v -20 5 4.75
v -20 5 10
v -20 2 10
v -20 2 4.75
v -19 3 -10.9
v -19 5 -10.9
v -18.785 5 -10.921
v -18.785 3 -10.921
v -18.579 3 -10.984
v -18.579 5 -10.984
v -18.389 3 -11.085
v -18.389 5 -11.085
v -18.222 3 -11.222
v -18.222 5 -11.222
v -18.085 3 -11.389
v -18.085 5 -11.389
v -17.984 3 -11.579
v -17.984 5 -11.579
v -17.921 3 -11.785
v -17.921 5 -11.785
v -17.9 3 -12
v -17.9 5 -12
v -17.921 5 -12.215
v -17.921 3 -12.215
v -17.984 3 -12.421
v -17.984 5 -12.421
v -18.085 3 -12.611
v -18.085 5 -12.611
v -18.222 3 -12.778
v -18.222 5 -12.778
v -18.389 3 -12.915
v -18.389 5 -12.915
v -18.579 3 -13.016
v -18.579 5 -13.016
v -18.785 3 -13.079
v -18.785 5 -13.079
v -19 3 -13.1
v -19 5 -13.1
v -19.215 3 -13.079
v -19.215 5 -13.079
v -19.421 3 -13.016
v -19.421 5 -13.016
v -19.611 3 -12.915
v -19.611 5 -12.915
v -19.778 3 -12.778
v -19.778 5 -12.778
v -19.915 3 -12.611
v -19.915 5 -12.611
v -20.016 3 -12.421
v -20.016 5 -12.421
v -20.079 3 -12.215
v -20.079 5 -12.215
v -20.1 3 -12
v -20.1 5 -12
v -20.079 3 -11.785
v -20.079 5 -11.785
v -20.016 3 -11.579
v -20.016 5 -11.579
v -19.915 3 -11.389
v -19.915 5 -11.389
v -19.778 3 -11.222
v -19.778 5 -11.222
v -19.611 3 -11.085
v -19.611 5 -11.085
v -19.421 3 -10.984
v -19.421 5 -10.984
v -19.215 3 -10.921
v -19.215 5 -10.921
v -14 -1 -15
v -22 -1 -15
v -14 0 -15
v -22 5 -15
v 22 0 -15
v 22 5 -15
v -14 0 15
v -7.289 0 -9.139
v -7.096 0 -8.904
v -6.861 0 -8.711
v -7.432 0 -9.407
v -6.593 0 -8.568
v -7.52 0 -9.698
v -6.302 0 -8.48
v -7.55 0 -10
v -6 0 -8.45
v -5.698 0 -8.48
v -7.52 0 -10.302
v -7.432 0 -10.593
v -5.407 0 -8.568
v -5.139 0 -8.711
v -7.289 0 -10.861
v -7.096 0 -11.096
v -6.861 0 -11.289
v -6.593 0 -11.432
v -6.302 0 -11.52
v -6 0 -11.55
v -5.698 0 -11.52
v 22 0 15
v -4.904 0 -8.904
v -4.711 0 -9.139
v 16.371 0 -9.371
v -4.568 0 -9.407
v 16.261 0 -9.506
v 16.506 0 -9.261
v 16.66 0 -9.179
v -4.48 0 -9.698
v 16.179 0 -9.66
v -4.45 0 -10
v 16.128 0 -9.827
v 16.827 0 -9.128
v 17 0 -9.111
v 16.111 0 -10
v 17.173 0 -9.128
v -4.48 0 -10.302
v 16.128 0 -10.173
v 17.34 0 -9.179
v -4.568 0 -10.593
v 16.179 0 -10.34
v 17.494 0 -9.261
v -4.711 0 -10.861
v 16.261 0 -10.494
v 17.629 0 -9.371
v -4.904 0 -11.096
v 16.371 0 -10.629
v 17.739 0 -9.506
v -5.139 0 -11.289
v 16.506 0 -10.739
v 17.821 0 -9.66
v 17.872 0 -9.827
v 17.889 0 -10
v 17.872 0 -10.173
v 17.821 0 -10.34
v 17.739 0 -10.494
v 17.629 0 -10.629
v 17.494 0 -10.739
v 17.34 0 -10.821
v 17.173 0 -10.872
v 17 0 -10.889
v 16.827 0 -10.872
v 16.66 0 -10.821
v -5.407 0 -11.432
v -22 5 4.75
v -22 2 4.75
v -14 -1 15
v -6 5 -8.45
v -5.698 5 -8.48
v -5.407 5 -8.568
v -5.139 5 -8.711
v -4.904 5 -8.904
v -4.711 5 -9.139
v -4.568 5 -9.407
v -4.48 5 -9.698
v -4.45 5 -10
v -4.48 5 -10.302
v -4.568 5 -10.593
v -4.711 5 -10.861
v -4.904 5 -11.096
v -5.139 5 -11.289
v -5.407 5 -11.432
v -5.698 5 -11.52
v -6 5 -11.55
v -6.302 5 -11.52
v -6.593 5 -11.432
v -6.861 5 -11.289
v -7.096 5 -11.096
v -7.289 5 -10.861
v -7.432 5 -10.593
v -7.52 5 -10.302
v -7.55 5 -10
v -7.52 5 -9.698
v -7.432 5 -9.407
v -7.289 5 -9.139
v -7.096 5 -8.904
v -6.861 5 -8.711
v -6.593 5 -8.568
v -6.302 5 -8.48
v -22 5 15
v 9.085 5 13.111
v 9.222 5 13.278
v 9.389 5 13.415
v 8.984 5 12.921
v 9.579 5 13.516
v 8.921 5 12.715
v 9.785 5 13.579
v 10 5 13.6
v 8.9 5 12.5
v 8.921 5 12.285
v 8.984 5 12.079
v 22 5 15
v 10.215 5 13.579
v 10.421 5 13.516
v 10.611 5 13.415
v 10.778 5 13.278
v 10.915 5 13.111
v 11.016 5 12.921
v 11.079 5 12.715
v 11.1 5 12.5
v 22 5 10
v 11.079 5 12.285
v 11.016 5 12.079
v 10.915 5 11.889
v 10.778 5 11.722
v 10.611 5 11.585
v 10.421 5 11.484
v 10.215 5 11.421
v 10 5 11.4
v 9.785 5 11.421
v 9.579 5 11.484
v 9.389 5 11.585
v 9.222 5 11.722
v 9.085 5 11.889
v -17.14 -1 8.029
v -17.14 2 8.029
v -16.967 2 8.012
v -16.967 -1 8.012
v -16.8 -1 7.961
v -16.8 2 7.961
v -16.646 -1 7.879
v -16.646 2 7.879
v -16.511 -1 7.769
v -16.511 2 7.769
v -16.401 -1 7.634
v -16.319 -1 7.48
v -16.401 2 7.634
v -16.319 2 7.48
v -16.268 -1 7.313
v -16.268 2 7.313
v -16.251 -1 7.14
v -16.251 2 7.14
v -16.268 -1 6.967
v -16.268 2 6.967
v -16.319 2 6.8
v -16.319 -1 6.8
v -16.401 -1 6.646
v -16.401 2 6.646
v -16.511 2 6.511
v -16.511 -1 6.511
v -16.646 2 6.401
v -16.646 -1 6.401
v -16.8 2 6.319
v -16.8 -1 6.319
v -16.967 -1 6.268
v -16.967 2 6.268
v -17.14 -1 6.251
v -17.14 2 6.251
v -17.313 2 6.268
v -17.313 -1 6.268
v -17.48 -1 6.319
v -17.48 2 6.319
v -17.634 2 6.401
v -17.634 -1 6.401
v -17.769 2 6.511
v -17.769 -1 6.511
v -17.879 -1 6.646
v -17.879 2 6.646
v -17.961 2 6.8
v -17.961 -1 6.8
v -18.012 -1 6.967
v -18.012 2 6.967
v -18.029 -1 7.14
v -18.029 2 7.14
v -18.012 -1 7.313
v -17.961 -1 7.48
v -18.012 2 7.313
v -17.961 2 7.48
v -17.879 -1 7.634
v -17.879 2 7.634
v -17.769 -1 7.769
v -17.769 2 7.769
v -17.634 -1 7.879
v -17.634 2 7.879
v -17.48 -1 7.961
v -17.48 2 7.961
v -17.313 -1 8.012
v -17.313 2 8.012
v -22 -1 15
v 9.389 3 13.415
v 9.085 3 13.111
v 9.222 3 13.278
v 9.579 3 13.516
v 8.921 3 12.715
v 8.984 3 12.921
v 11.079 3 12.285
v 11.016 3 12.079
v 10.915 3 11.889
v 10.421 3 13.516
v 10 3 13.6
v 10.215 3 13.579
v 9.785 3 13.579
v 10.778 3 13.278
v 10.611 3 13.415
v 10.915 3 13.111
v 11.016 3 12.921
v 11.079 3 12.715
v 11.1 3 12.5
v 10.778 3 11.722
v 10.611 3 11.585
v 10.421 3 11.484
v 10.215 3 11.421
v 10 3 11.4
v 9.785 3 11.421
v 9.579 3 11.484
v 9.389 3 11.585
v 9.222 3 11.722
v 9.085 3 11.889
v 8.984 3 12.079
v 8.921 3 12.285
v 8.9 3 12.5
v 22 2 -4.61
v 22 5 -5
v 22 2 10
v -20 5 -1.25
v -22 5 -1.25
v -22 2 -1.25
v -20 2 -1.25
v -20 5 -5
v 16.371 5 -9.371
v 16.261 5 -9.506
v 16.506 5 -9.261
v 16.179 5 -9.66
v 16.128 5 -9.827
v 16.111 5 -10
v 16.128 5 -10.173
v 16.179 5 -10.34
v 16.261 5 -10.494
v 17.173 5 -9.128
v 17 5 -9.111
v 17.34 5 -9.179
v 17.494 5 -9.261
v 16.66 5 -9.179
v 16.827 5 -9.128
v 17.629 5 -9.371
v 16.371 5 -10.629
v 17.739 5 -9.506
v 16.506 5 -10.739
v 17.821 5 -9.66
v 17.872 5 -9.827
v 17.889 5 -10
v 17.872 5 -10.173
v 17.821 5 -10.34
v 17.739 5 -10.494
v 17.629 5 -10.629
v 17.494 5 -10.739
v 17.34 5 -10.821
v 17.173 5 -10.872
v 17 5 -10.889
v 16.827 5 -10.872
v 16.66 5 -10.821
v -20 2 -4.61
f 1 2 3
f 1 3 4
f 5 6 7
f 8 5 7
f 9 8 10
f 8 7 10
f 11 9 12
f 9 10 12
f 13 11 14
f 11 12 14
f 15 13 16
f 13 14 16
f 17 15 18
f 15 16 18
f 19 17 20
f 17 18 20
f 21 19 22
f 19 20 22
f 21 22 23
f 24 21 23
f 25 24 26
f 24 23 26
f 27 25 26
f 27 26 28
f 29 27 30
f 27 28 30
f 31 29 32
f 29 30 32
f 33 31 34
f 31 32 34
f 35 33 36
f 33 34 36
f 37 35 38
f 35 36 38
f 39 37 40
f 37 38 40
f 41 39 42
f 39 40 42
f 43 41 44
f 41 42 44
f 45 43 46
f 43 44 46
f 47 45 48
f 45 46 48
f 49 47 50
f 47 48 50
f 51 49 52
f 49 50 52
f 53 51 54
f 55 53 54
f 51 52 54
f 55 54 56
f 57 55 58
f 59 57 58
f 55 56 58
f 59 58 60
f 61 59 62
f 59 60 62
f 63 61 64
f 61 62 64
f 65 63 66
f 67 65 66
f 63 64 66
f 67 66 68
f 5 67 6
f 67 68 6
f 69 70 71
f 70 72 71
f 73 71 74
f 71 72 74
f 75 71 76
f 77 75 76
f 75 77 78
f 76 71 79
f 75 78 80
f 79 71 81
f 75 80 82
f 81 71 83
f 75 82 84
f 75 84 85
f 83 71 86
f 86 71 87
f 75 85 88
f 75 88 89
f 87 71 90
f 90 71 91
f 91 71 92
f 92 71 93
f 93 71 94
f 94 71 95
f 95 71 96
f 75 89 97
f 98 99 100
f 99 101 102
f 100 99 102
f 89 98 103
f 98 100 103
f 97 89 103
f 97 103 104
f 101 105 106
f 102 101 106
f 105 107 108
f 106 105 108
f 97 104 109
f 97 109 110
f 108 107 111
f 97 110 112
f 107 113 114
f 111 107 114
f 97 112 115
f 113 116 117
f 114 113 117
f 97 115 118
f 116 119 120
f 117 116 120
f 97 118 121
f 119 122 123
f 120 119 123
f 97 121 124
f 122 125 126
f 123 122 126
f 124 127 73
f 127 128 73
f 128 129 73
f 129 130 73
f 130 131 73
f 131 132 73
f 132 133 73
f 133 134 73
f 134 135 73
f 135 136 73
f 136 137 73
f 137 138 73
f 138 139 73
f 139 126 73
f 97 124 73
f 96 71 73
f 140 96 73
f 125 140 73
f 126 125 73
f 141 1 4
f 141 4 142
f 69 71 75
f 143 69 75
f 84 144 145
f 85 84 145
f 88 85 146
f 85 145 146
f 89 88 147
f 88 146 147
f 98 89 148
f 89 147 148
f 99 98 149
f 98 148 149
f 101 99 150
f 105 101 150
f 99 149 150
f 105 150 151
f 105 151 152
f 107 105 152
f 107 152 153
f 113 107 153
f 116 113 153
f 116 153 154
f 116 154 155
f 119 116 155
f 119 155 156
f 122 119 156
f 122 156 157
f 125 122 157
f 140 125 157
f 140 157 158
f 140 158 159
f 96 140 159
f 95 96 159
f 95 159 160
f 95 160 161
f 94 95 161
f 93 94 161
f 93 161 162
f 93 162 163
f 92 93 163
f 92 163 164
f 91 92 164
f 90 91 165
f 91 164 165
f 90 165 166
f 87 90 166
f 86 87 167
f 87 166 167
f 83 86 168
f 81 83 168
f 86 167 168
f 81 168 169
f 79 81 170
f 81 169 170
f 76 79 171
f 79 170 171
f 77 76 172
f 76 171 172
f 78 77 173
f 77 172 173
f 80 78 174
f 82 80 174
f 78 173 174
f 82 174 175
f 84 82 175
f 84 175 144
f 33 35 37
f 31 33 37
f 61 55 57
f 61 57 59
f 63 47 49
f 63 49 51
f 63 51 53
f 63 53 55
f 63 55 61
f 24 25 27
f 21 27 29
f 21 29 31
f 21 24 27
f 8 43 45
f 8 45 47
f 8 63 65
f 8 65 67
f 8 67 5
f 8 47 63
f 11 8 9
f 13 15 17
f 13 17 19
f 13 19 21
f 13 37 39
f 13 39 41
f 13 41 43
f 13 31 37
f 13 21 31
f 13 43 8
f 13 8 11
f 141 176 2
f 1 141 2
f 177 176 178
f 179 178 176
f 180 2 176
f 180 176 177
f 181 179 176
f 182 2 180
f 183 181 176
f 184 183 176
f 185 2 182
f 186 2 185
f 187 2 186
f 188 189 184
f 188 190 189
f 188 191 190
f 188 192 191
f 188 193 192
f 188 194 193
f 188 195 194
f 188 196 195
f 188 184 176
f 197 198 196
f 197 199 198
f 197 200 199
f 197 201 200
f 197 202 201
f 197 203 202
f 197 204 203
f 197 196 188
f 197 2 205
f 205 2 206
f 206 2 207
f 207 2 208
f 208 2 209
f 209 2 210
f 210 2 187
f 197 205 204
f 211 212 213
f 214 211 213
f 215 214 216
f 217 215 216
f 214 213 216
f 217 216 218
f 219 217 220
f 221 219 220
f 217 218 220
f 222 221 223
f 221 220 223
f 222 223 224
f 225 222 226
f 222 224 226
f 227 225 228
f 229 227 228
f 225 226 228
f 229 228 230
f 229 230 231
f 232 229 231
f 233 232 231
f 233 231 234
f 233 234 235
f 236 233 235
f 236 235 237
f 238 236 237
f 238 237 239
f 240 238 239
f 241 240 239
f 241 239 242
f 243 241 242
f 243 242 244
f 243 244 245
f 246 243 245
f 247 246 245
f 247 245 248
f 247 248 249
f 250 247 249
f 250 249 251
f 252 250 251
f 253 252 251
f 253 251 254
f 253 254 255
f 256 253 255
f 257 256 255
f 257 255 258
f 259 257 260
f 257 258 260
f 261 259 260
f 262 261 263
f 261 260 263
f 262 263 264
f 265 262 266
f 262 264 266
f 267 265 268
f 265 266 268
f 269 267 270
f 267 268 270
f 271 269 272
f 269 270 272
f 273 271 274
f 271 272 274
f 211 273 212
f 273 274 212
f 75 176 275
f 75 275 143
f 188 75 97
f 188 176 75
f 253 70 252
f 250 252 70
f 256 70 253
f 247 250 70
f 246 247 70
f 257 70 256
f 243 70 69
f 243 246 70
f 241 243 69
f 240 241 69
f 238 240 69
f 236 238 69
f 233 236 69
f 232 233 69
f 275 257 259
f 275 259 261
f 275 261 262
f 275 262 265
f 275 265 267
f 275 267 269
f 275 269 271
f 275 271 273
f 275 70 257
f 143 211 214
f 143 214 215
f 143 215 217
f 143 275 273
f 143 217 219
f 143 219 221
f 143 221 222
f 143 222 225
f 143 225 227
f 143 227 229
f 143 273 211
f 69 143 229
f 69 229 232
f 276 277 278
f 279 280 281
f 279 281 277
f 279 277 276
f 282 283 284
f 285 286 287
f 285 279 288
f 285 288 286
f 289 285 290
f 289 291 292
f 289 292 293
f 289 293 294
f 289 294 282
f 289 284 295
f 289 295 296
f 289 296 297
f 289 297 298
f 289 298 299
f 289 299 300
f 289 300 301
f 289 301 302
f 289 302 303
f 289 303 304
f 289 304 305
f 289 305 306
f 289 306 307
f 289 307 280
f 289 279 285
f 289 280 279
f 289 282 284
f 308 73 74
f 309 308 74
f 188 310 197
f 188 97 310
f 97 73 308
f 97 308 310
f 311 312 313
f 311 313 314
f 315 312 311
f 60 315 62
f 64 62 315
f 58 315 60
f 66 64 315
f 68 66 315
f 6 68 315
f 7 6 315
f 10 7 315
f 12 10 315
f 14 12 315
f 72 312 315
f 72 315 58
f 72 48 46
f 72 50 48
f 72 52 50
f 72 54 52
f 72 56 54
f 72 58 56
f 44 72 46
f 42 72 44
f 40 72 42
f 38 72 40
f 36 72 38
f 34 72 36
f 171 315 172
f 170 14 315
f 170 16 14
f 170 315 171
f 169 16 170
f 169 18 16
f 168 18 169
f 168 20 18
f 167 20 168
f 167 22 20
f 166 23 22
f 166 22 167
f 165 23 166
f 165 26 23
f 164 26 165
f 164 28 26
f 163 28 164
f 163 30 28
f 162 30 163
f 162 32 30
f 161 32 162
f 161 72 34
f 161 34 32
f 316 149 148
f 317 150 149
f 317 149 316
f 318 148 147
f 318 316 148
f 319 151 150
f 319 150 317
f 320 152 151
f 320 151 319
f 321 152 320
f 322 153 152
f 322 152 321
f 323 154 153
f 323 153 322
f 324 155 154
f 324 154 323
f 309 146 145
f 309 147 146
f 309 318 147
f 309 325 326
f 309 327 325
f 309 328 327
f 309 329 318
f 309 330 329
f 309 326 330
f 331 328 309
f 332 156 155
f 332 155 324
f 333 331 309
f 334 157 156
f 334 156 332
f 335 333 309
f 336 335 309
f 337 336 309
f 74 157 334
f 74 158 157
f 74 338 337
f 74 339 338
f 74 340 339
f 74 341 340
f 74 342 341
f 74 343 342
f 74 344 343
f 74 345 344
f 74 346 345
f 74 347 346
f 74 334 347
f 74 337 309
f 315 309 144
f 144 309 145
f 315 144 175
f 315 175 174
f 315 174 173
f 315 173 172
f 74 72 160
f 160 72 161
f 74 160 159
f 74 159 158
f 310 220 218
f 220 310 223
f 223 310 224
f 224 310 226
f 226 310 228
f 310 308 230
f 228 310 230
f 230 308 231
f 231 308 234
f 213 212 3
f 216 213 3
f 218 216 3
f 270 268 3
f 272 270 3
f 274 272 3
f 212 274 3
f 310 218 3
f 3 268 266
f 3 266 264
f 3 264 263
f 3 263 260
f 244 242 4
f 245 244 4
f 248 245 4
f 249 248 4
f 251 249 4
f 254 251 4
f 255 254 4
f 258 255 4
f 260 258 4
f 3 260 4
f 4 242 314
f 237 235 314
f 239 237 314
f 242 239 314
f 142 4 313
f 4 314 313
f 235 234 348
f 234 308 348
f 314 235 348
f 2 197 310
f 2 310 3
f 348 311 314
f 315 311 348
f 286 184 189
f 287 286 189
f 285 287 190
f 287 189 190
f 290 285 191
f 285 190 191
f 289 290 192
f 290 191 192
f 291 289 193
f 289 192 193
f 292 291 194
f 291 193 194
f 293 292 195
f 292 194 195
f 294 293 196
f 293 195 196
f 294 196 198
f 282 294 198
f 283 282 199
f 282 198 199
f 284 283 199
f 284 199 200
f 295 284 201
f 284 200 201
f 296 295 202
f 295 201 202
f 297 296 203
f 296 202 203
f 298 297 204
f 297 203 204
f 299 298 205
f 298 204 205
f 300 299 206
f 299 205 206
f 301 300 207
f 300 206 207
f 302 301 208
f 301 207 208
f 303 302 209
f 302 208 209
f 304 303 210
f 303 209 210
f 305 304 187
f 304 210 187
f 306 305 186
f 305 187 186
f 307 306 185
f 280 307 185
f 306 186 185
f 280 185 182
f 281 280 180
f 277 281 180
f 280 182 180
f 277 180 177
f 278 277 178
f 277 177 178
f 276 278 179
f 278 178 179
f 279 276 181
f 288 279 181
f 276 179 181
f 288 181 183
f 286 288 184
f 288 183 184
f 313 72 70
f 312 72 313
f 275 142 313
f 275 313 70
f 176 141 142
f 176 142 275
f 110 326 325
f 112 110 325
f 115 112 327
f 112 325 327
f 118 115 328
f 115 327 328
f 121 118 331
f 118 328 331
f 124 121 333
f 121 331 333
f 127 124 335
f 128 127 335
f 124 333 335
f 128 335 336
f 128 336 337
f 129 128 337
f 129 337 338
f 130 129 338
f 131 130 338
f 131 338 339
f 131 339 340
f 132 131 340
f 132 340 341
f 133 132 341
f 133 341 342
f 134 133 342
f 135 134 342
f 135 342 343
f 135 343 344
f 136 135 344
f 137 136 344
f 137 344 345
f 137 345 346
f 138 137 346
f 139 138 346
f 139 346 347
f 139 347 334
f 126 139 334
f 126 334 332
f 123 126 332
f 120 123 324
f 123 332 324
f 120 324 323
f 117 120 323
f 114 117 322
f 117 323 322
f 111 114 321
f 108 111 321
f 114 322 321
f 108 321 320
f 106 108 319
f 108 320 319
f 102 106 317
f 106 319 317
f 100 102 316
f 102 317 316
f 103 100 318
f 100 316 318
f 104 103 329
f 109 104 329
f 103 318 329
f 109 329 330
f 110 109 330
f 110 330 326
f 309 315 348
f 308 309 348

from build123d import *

# Parameters (mm, degrees)
SKETCH1_W           = 44
SKETCH1_H           = 30
BOSS_EXTRUDE1_DEPTH = 5
SKETCH2_W           = 8
SKETCH2_H           = 30
BOSS_EXTRUDE2_DEPTH = 1
SKETCH3_R           = 1.55
CUT_EXTRUDE1_DEPTH  = 28.294688128
CUT_EXTRUDE2_DEPTH  = 3
SKETCH7_R           = 1.1
CUT_EXTRUDE4_DEPTH  = 2
SKETCH5_R           = 0.889
CUT_EXTRUDE5_DEPTH  = 27.795522014
SKETCH6_R           = 0.889
CUT_EXTRUDE6_DEPTH  = 28.294688128
CHAMFER2_SIZE       = 3
CHAMFER2_SIZE_2     = 0.39


with BuildPart() as part:
    # Sketch1 → Boss-Extrude1 (new body)
    with BuildSketch(Plane(origin=(0, 0, 0), x_dir=(1, 0, 0), z_dir=(0, 1, 0))):
        Rectangle(SKETCH1_W, SKETCH1_H)
    extrude(amount=BOSS_EXTRUDE1_DEPTH)

    # Sketch2 → Boss-Extrude2 (add)
    with BuildSketch(Plane.XZ):
        with Locations((-18, 0)):
            Rectangle(SKETCH2_W, SKETCH2_H)
    extrude(amount=BOSS_EXTRUDE2_DEPTH)

    # Sketch3 → Cut-Extrude1 (cut, through all)
    with BuildSketch(Plane(origin=(0, 5, 0), x_dir=(1, 0, 0), z_dir=(0, 1, 0))):
        with Locations(Location((-6, 10, 0), (0, 0, 270))):
            Circle(SKETCH3_R)
    extrude(amount=-CUT_EXTRUDE1_DEPTH, mode=Mode.SUBTRACT)

    # Sketch4 → Cut-Extrude2 (cut)
    with BuildSketch(Plane(origin=(0, 5, 0), x_dir=(1, 0, 0), z_dir=(0, 1, 0))):
        Polygon((22, -10), (-20, -10), (-20, -4.75), (-22, -4.75), (-22, 1.25), (-20, 1.25), (-20, 5), (22, 5), align=None)
    extrude(amount=-CUT_EXTRUDE2_DEPTH, mode=Mode.SUBTRACT)

    # Sketch7 → Cut-Extrude4 (cut)
    with BuildSketch(Plane(origin=(0, 5, 0), x_dir=(1, 0, 0), z_dir=(0, 1, 0))):
        with Locations(Location((-19, 12, 0), (0, 0, 270))):
            Circle(SKETCH7_R)
        with Locations(Location((10, -12.5, 0), (0, 0, 270))):
            Circle(SKETCH7_R)
    extrude(amount=-CUT_EXTRUDE4_DEPTH, mode=Mode.SUBTRACT)

    # Sketch5 → Cut-Extrude5 (cut, through all)
    with BuildSketch(Plane(origin=(0, 2, 0), x_dir=(1, 0, 0), z_dir=(0, 1, 0))):
        with Locations(Location((-17.14, -7.14, 0), (0, 0, 270))):
            Circle(SKETCH5_R)
    extrude(amount=-CUT_EXTRUDE5_DEPTH, mode=Mode.SUBTRACT)

    # Sketch6 → Cut-Extrude6 (cut, through all)
    with BuildSketch(Plane(origin=(0, 5, 0), x_dir=(1, 0, 0), z_dir=(0, 1, 0))):
        with Locations(Location((17, 10, 0), (0, 0, 270))):
            Circle(SKETCH6_R)
    extrude(amount=-CUT_EXTRUDE6_DEPTH, mode=Mode.SUBTRACT)

    # Chamfer2
    # the kernel refuses this chamfer: 3, 0.39 mm, written as the material it adds along each edge
    with BuildSketch(Plane(origin=(-20, 2, -5), x_dir=(0, 0.9999877000722414, -0.004959808890380354), z_dir=(1, 0, 0))) as chamfer2_piece_1_section:
        Polygon((CHAMFER2_SIZE * 0.999987700072, CHAMFER2_SIZE * 0.00495980889038), (-CHAMFER2_SIZE_2 * 0.00495980889038, CHAMFER2_SIZE_2 * 0.999987700072), (0, 0), align=None)
    chamfer2_piece_1 = extrude(amount=42, mode=Mode.PRIVATE)
    chamfer2_piece_1 = split(chamfer2_piece_1, bisect_by=Plane(origin=(1, 5, -4.903199608), z_dir=(0, -1, 0)), keep=Keep.TOP, mode=Mode.PRIVATE)
    add(chamfer2_piece_1)


solid = part.part
